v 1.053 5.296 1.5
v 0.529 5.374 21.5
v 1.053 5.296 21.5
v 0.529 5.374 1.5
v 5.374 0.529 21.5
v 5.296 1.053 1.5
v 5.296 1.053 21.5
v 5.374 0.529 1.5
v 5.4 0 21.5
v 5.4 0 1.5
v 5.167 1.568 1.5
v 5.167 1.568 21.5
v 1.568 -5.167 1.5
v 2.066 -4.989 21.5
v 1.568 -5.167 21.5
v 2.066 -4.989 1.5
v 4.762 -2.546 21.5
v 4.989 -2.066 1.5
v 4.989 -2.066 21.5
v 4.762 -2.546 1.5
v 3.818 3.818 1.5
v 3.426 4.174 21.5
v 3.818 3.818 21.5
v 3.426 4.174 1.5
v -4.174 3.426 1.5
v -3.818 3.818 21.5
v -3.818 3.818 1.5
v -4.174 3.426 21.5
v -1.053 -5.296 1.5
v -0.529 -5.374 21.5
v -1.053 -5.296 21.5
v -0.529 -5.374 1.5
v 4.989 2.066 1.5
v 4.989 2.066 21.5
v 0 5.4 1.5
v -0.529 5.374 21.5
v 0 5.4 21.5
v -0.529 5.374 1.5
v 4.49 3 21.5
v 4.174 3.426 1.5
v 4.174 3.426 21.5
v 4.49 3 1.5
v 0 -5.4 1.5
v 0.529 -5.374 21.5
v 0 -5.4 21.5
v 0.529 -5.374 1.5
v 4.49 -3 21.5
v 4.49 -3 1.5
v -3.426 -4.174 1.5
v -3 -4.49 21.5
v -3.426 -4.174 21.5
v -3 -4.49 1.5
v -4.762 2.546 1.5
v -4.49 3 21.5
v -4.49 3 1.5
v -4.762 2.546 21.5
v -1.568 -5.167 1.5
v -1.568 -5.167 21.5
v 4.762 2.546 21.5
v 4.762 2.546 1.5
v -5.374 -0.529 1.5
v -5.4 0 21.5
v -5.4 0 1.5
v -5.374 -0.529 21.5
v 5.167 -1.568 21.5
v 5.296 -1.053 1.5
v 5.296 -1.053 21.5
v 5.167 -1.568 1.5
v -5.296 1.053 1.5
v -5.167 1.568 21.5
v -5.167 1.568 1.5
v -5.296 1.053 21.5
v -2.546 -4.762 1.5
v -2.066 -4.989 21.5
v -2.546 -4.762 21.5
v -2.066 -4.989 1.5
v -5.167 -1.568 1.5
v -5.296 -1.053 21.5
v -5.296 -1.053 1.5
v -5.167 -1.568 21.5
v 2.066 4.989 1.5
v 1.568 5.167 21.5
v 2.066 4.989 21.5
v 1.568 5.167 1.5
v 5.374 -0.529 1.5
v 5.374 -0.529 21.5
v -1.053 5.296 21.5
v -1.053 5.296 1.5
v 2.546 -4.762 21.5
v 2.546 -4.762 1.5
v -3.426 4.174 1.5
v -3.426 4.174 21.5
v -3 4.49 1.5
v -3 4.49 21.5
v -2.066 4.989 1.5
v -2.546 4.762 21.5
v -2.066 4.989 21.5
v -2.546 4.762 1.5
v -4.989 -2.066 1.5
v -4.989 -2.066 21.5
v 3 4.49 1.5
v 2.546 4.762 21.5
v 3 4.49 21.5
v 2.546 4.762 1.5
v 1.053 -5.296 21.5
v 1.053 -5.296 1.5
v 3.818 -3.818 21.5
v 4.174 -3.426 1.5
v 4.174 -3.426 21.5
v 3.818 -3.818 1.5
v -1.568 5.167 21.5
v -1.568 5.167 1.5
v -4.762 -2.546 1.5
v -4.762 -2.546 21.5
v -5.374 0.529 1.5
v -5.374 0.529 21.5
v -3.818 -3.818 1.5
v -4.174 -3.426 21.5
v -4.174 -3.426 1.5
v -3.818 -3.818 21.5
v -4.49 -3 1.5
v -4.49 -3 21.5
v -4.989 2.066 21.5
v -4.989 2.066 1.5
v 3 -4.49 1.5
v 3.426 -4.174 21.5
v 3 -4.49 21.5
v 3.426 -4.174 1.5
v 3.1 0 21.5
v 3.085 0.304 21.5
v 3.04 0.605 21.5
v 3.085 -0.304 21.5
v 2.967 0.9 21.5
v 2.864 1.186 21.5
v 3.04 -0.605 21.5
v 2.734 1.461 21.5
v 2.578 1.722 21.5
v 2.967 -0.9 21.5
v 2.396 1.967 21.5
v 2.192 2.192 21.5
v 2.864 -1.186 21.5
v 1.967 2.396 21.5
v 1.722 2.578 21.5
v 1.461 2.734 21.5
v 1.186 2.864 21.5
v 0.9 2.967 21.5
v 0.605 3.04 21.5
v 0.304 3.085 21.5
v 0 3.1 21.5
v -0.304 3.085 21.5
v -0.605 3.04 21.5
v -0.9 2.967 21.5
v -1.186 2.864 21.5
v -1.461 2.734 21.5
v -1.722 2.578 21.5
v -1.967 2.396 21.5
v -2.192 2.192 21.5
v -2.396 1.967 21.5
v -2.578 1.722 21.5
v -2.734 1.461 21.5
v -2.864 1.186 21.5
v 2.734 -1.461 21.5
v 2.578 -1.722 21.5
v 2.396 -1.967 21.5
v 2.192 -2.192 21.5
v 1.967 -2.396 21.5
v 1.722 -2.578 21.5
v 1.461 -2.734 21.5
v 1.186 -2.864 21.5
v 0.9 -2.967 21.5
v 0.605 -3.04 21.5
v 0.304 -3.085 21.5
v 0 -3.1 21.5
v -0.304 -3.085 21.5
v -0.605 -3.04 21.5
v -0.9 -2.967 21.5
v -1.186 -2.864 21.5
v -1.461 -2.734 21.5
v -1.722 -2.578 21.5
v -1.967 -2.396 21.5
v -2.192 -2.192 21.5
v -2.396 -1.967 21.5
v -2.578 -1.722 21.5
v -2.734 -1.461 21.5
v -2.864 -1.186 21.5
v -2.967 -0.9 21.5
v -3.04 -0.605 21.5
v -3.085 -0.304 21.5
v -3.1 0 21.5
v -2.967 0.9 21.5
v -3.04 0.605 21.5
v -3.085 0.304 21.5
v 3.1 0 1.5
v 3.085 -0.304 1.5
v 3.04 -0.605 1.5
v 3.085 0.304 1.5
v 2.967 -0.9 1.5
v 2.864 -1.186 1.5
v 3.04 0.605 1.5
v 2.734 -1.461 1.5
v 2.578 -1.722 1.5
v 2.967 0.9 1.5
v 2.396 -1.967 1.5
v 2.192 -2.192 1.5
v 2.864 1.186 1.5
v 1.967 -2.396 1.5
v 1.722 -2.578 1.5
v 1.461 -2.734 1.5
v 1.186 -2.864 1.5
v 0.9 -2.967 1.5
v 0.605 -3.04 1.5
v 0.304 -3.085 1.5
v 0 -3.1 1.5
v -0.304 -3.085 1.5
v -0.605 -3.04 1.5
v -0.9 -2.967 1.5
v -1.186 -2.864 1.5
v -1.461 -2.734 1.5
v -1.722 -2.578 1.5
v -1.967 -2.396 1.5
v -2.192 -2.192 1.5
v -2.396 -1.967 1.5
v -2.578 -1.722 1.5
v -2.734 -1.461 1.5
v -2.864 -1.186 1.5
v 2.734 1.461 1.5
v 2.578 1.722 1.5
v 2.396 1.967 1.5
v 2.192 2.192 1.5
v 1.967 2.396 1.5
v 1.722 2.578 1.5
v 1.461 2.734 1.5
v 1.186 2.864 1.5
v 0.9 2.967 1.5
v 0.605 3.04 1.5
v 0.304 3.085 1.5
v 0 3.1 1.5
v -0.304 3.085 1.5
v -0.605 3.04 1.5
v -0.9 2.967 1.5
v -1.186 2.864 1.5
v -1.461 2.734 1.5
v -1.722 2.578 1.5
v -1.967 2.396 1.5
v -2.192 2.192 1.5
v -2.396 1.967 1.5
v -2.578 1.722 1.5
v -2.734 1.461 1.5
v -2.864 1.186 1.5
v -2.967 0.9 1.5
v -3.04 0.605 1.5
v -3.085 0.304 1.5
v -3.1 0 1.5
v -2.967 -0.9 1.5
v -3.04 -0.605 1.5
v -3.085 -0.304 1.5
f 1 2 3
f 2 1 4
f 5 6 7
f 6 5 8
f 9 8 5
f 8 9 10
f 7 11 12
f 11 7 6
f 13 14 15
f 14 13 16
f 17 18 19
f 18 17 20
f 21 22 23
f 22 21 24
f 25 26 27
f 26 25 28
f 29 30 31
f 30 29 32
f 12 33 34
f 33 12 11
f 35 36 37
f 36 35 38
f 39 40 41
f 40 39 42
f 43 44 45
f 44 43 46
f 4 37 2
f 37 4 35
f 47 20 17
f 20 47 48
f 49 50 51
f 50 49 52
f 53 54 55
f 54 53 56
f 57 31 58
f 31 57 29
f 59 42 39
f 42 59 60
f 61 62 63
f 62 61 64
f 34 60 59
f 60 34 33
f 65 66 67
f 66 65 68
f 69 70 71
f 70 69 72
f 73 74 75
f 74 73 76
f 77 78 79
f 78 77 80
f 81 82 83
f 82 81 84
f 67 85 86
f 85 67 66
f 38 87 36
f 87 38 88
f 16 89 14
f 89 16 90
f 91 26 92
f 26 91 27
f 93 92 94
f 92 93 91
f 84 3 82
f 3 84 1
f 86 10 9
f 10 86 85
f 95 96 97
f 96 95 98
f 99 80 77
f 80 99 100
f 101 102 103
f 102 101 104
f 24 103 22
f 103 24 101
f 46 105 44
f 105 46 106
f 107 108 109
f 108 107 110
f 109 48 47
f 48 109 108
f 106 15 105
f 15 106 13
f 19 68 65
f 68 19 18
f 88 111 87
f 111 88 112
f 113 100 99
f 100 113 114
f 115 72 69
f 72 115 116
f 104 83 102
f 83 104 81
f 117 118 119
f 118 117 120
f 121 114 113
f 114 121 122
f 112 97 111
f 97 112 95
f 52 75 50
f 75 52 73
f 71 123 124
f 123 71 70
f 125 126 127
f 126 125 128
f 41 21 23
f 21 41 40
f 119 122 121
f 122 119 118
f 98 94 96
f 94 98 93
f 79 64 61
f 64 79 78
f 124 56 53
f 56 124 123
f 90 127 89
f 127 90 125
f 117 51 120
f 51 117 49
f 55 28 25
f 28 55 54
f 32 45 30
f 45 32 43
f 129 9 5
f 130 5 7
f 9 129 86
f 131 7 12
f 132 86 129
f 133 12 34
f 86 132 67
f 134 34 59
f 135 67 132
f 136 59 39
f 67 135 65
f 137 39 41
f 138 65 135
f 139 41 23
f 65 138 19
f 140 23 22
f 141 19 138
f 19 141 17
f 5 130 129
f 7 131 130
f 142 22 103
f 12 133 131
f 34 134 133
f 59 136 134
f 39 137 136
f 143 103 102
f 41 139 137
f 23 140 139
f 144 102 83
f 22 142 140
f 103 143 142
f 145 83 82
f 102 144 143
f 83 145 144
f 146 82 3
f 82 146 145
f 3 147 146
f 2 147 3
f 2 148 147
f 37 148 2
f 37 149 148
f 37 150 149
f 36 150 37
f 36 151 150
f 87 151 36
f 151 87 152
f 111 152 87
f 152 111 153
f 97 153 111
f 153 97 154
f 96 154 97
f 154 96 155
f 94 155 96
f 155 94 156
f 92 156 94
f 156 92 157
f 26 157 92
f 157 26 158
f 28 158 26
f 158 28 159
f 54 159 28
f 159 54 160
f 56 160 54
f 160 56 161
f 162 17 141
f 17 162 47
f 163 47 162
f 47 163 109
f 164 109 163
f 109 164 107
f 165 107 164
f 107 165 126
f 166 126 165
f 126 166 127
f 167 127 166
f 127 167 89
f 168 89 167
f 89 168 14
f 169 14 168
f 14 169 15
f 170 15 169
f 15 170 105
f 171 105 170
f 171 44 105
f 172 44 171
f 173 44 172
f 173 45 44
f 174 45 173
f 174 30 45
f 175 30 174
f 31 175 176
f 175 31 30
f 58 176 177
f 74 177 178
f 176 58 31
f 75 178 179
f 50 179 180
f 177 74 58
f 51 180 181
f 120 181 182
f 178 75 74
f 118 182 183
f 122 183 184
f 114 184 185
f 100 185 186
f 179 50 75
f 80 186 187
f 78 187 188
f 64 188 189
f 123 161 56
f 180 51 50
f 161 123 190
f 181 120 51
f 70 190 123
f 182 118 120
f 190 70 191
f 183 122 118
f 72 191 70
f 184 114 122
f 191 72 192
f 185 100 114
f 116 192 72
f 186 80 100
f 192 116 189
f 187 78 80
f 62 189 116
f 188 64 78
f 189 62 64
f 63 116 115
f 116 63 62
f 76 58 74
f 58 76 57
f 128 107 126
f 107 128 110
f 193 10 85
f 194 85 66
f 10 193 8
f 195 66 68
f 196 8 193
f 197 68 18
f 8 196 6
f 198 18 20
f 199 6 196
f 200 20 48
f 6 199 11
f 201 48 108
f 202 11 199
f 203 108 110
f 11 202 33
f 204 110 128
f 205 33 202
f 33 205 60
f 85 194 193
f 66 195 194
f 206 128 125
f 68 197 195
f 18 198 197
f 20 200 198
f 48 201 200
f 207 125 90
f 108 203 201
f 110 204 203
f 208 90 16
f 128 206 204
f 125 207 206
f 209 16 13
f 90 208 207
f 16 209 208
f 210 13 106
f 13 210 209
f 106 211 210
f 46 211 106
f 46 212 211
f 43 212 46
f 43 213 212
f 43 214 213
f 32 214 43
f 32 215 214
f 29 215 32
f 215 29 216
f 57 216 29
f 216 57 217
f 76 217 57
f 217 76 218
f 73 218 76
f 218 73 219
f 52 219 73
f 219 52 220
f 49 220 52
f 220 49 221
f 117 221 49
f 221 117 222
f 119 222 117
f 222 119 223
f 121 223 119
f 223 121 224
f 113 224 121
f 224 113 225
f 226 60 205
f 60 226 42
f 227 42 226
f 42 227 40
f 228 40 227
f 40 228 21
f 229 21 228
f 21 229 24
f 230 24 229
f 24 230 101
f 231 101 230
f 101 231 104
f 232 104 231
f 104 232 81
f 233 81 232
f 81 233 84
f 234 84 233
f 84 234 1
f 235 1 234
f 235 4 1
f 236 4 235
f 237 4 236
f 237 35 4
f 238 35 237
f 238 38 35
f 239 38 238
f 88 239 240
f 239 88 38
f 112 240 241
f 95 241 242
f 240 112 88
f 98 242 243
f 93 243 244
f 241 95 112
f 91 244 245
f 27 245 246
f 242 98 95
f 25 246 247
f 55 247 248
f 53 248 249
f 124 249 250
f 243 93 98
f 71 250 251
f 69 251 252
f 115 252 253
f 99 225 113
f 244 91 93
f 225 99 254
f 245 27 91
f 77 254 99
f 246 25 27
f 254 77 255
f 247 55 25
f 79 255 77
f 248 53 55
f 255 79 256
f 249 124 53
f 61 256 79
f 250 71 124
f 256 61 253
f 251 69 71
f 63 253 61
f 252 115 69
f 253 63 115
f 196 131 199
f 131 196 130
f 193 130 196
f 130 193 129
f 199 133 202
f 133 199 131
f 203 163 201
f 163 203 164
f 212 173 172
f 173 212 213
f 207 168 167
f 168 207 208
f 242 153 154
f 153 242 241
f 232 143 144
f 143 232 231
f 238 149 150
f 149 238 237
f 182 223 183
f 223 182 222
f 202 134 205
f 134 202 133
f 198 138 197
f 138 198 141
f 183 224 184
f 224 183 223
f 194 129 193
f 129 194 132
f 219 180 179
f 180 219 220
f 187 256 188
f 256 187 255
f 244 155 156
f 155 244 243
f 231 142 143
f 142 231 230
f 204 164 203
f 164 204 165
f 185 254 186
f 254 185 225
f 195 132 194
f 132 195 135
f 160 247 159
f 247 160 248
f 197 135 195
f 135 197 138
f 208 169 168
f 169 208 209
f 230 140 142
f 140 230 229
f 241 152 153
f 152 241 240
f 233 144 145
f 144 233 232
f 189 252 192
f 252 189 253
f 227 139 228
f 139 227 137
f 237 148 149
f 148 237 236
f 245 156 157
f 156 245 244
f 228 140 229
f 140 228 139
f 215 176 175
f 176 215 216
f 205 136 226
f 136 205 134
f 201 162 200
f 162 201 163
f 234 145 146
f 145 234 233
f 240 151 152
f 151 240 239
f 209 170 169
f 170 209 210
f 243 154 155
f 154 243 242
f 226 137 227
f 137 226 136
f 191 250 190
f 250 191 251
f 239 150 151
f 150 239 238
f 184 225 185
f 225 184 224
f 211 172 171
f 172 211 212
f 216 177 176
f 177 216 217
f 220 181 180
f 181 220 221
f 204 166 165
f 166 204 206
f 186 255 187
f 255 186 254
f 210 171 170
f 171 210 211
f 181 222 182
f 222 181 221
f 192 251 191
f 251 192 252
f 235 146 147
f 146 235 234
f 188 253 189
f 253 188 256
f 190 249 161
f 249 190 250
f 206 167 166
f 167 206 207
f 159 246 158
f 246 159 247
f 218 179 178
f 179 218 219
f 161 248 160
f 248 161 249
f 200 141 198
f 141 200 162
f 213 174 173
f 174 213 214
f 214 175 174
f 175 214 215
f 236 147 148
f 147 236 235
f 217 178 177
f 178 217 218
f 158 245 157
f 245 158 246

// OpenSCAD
// PCR Tube Adapter Sleeve - fits 0.2mL tubes into 1.5mL rack holes.
// Print orientation: Collar on bed (Z=0), body rises upward.

// Dimensions
collar_od = 13;      // Collar outer diameter
collar_thick = 1.5;  // Collar thickness (Z=0 to 1.5)
body_od = 10.8;      // Sleeve body outer diameter
body_top_z = 21.5;   // Top of sleeve body
bore_d = 6.2;        // Through-hole diameter

$fn = 64;

// Calculate body height
body_height = body_top_z - collar_thick;

difference() {
    // Main body: Cylinder from Z=0 to Z=body_top_z
    translate([0, 0, 0]) 
        cylinder(h = body_top_z, d = body_od);
    
    // Collar: Ring from Z=0 to Z=collar_thick
    // Outer radius = collar_od/2, Inner radius = body_od/2
    translate([0, 0, 0]) 
        cylinder(h = collar_thick, d = collar_od);
    
    // Through-hole: Cylinder extending slightly past top and bottom
    translate([0, 0, -1]) 
        cylinder(h = body_top_z + 2, d = bore_d);
}
